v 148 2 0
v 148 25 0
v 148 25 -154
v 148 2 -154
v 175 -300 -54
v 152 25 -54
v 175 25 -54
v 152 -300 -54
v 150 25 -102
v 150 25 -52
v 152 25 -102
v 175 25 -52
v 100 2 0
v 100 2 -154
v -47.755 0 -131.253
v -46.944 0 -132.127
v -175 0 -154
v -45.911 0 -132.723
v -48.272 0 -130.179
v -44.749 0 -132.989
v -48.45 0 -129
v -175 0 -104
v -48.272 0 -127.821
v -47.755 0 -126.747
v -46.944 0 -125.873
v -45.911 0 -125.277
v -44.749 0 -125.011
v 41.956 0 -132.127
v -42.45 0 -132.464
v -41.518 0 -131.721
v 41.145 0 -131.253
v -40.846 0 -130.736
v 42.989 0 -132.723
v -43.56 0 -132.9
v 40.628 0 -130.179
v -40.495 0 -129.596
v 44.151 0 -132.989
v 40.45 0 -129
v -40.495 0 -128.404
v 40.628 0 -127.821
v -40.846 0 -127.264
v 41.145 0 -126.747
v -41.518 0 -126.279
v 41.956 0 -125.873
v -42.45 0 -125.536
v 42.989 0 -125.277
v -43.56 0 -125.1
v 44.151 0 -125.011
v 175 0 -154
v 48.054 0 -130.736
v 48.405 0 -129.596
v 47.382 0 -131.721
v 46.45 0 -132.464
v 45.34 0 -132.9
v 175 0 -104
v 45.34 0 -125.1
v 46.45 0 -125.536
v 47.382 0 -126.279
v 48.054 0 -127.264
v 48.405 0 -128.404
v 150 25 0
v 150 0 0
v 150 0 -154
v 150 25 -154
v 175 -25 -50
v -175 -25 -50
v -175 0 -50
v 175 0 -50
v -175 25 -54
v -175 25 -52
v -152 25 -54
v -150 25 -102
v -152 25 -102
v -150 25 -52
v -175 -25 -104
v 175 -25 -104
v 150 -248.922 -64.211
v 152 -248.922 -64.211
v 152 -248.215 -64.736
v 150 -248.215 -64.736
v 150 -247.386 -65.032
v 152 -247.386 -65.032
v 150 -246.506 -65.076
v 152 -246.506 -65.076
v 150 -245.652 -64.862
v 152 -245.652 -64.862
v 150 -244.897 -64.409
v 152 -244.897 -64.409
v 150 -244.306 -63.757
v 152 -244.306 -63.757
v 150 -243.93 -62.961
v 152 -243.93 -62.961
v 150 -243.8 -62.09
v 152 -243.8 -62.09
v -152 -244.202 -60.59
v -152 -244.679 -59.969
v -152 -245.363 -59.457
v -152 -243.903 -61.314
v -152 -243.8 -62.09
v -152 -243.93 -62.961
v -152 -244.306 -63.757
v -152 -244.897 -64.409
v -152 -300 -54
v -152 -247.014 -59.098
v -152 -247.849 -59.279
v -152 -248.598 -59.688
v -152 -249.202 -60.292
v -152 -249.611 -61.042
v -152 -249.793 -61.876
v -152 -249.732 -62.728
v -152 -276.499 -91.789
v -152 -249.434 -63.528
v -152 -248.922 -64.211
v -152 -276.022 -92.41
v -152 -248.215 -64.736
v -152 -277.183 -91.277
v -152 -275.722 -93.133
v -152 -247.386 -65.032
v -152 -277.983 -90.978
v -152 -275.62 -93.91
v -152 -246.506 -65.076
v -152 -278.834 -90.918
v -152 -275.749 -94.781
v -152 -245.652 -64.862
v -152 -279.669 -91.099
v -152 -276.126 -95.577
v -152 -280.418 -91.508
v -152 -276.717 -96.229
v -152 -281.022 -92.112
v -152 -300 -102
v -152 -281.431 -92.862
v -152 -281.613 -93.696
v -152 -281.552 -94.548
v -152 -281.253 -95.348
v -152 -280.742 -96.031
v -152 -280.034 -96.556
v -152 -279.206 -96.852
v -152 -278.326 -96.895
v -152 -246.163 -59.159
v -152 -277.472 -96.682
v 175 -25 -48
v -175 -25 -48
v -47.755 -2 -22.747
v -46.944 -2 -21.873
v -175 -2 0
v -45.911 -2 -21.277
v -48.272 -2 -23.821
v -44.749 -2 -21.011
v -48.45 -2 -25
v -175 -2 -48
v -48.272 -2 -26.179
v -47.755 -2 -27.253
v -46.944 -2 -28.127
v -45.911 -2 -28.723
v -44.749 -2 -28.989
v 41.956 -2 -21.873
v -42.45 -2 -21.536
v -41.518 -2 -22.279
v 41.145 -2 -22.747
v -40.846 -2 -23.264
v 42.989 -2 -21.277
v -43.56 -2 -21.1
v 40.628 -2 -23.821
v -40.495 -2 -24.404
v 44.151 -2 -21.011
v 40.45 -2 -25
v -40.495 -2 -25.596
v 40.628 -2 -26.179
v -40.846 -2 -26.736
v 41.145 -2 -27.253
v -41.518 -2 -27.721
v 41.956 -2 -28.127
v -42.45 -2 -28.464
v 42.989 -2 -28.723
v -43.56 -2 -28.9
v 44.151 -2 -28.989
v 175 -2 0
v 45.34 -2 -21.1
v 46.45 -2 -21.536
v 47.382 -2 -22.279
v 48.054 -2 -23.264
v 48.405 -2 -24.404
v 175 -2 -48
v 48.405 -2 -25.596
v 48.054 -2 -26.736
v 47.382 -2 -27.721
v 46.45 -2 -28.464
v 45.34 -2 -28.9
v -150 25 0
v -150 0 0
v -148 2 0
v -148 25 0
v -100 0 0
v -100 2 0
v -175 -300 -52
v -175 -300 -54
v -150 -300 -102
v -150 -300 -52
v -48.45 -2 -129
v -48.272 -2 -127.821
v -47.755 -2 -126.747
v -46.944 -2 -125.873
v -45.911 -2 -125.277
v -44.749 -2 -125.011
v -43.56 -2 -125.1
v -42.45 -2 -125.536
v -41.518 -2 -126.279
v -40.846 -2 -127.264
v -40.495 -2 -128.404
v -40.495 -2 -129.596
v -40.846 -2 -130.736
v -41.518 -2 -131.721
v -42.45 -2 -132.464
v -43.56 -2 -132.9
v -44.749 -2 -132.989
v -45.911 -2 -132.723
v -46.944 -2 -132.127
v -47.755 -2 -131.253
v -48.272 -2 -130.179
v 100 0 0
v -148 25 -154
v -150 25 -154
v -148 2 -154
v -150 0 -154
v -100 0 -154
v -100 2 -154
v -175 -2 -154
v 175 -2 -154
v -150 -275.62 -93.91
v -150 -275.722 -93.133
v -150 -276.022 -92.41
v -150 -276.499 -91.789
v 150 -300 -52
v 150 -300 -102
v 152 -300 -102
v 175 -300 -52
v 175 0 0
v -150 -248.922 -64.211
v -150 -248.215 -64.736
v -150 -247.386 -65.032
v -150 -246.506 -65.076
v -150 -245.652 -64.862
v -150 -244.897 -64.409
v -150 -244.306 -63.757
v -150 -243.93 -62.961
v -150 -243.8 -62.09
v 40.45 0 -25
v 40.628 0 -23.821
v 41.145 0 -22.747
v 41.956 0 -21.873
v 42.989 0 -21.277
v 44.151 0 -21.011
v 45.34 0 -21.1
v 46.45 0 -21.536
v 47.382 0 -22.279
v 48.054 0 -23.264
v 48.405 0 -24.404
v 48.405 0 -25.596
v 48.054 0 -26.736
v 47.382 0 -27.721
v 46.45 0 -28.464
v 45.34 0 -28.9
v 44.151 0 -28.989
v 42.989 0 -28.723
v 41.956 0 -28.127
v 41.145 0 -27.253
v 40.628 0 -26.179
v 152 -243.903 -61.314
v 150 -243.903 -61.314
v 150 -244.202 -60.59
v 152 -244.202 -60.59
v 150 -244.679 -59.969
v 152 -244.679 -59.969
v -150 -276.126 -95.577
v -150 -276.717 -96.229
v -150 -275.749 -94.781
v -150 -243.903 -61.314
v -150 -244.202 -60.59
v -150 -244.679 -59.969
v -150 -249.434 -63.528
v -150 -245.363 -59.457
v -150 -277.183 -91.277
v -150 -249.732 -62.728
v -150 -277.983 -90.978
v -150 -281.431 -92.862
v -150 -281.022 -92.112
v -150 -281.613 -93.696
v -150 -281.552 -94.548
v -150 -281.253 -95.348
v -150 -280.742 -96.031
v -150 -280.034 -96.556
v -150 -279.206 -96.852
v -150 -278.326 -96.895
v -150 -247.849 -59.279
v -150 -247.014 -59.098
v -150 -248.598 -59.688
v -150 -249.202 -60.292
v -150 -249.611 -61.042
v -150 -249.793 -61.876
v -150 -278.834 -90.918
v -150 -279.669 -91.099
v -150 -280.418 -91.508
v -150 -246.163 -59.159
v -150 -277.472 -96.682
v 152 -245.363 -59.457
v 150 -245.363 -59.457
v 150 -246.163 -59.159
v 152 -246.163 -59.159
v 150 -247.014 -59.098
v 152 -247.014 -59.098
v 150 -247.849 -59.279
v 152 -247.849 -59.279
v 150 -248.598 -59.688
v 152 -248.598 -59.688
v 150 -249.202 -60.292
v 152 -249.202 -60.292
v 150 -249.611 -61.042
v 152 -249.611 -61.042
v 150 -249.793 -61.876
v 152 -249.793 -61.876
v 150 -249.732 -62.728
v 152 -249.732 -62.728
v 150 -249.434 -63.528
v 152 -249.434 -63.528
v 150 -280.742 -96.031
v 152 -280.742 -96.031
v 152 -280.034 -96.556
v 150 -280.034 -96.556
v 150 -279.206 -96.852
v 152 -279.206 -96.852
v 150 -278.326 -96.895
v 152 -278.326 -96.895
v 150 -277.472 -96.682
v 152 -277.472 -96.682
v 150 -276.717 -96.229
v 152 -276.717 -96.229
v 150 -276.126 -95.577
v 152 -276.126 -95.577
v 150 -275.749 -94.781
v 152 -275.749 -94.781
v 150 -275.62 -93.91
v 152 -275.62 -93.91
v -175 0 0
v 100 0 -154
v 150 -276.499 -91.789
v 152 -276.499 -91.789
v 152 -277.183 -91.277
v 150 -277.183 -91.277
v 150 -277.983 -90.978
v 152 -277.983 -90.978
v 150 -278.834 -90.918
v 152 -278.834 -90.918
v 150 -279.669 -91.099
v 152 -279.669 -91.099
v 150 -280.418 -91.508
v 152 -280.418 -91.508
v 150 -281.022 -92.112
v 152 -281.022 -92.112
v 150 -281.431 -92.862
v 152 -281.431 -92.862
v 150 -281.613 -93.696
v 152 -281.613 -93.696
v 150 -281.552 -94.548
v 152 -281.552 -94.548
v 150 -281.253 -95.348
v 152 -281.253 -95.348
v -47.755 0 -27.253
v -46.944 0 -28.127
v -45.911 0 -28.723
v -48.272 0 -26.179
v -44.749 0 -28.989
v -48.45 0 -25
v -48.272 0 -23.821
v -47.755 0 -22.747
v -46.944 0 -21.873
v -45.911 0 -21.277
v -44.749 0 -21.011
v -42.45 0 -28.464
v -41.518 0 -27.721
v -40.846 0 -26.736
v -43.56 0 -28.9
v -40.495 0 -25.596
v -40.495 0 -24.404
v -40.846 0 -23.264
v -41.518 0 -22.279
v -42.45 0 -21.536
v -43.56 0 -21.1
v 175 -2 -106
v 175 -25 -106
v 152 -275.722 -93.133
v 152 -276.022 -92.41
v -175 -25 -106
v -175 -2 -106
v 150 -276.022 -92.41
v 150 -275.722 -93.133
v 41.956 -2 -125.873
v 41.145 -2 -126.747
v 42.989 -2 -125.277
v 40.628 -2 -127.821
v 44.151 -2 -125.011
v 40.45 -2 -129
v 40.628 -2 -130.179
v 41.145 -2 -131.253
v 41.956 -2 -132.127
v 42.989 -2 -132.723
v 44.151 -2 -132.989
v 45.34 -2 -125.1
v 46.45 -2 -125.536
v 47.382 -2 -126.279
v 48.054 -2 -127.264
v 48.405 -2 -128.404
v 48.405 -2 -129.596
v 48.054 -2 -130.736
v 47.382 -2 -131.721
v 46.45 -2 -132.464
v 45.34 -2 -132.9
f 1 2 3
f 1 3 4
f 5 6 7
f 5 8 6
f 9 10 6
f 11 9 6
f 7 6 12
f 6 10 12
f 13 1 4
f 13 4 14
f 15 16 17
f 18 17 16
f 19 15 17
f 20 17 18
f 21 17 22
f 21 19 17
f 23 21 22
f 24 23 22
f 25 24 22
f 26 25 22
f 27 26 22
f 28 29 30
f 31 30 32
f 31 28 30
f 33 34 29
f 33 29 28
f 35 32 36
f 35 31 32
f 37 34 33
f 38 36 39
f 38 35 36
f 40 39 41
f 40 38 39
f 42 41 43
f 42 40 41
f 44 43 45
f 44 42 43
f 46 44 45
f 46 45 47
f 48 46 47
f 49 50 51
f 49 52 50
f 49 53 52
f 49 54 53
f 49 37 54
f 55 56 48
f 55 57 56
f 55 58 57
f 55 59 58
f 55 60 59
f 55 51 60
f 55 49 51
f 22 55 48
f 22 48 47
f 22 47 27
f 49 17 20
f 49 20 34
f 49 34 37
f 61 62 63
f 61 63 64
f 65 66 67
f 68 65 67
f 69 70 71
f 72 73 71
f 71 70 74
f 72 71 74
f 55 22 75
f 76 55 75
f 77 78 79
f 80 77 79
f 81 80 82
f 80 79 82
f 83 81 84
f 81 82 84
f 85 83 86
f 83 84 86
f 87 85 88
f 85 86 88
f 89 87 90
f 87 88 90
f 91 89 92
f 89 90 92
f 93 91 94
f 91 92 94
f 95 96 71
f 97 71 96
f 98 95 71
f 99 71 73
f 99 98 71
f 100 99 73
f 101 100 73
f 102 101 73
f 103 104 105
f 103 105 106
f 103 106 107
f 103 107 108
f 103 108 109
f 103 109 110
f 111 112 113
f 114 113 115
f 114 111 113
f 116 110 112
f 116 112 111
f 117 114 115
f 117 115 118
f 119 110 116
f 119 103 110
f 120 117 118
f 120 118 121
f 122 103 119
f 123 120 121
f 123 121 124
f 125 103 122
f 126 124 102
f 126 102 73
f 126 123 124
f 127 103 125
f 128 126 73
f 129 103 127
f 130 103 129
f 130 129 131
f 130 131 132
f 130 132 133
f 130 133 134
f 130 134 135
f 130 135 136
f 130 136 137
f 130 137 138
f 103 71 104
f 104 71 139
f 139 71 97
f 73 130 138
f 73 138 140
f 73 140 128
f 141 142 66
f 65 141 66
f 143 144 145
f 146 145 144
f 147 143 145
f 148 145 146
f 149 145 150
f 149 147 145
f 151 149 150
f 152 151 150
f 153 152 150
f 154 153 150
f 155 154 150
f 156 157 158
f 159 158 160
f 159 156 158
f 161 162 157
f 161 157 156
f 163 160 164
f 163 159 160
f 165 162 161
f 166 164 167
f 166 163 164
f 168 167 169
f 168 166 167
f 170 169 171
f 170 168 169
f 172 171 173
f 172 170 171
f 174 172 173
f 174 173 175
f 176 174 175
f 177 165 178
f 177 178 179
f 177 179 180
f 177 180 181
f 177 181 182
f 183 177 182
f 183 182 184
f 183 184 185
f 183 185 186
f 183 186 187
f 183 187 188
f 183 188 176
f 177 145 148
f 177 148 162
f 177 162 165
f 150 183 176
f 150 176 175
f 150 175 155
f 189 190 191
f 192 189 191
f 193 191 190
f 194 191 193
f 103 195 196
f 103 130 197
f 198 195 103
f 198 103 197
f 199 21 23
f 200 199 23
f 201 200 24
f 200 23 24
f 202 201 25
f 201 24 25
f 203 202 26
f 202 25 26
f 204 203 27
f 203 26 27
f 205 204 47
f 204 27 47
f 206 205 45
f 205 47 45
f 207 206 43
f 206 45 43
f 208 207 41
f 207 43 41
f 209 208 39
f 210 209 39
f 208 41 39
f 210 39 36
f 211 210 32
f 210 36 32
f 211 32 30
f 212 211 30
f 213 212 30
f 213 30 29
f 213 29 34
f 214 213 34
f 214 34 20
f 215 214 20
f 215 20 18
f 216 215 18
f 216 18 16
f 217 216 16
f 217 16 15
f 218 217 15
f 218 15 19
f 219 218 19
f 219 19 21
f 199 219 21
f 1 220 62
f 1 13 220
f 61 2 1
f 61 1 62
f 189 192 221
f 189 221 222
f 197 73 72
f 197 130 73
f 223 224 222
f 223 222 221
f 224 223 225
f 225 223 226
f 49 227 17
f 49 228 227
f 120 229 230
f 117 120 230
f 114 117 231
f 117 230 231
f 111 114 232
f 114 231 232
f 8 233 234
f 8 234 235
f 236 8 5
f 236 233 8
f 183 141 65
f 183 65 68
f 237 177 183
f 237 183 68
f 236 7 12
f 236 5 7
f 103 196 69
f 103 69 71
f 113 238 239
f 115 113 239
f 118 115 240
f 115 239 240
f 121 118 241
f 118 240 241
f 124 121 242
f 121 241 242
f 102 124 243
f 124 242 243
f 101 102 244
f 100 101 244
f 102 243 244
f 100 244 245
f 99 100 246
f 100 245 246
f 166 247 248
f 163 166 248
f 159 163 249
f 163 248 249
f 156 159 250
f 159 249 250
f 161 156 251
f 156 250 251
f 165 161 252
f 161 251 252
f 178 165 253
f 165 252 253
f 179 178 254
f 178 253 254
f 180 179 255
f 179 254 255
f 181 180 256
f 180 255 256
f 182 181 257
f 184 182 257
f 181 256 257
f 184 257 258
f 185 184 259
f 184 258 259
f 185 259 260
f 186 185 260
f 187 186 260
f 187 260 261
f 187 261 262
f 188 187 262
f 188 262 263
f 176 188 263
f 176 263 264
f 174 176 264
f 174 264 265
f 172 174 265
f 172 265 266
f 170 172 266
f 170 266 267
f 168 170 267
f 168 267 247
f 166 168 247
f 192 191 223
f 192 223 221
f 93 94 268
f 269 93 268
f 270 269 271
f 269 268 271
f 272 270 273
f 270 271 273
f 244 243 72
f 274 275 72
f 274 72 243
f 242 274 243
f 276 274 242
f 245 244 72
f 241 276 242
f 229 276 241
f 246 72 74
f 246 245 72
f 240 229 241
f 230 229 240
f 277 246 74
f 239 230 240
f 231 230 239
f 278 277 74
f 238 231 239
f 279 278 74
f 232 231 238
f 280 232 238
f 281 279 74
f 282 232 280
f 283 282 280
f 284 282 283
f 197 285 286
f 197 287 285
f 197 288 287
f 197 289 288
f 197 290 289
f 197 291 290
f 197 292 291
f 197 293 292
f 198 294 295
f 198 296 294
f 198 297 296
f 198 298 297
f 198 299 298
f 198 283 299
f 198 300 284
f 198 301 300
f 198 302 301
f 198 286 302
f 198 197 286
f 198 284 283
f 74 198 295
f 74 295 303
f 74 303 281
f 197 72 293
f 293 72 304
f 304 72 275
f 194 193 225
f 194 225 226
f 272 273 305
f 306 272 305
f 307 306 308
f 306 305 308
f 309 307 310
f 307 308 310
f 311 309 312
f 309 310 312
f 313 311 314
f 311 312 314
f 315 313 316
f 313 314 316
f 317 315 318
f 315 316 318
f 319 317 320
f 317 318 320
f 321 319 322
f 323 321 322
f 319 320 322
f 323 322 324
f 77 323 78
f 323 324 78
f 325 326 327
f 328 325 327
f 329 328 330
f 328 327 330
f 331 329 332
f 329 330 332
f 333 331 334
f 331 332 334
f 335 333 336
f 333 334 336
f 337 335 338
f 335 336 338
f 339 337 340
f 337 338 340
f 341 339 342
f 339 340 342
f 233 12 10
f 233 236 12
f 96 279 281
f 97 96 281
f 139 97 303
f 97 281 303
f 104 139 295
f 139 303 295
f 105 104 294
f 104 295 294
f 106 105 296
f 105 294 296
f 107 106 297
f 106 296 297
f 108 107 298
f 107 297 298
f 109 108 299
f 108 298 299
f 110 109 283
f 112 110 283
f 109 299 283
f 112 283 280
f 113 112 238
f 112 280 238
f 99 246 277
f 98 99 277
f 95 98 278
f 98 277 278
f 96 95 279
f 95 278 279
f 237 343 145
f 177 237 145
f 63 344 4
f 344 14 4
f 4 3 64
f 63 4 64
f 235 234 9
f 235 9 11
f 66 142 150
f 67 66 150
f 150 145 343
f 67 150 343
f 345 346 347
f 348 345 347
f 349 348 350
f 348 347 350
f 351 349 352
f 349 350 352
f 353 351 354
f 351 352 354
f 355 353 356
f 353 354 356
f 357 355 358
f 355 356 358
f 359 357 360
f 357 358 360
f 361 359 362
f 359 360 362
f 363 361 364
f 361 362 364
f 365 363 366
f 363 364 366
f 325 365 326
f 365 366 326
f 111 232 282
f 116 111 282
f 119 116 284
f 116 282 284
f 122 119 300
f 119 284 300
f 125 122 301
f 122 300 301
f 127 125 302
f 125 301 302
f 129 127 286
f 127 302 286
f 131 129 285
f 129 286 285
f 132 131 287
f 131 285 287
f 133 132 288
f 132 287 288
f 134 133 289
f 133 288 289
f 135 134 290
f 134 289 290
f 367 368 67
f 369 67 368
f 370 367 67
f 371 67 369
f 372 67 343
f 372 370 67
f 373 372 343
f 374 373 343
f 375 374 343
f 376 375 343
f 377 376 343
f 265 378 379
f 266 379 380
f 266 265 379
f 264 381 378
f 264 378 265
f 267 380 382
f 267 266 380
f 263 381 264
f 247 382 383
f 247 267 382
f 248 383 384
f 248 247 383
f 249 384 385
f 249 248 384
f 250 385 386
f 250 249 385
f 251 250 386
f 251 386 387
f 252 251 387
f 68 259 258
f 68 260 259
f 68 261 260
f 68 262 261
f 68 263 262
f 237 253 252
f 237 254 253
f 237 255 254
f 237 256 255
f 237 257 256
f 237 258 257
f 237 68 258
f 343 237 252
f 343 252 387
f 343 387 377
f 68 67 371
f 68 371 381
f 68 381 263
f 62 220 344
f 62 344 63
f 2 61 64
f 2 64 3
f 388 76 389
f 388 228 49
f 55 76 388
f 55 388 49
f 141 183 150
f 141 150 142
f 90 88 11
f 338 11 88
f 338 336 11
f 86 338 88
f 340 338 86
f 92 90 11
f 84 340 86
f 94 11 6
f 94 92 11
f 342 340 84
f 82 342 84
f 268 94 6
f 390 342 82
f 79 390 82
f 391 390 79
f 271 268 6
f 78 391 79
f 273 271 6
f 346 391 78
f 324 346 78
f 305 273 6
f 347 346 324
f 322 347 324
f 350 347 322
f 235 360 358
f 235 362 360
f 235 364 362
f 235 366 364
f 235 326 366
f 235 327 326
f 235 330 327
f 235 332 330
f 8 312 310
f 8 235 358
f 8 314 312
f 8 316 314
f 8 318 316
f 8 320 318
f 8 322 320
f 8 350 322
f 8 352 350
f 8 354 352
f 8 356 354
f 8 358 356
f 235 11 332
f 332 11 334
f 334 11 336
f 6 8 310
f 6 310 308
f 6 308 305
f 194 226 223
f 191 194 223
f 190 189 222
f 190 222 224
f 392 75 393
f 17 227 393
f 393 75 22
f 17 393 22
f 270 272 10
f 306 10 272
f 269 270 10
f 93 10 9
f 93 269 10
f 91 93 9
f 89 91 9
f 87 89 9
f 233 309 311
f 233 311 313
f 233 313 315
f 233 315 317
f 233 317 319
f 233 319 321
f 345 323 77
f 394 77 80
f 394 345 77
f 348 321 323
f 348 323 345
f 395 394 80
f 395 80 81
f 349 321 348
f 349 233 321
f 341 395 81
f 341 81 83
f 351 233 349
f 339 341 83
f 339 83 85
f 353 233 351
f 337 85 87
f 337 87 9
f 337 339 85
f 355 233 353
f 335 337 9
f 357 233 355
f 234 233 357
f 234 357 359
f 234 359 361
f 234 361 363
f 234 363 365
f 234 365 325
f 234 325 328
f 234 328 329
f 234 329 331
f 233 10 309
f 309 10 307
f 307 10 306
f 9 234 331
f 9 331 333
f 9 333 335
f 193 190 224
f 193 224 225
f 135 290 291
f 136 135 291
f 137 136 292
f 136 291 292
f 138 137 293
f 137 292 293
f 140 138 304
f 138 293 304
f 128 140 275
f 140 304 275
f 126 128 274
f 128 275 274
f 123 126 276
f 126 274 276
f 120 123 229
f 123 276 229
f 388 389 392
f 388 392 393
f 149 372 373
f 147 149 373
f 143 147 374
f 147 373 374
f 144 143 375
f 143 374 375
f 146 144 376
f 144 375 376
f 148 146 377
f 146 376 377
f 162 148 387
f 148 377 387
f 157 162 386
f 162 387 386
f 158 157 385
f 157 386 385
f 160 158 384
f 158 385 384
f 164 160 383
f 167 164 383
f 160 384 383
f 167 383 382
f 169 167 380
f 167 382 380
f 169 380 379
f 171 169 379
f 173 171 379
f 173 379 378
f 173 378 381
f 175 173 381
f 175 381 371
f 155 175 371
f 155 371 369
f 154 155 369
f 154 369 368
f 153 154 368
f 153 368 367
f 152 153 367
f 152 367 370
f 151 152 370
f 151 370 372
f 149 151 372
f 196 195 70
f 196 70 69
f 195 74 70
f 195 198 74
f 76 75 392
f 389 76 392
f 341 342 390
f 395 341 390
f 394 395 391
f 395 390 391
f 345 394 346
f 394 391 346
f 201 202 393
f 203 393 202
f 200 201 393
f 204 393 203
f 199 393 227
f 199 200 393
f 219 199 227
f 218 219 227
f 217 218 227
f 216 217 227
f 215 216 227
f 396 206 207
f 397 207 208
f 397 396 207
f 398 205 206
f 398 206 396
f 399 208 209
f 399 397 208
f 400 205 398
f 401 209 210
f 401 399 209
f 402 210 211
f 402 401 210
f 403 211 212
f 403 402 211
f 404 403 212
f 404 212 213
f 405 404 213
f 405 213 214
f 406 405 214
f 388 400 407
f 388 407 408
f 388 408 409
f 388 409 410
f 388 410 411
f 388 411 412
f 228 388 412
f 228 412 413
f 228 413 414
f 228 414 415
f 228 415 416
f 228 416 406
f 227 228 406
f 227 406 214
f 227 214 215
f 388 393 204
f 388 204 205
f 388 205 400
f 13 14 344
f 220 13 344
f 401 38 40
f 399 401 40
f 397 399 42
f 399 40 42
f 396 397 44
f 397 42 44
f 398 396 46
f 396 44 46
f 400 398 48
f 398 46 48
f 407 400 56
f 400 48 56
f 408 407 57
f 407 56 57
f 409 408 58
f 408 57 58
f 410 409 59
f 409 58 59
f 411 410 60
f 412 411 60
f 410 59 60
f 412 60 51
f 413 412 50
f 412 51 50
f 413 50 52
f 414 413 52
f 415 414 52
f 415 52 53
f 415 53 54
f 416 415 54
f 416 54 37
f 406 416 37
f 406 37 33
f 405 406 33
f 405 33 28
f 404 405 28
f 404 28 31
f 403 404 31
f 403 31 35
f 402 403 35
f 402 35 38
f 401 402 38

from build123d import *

# Parameters (mm, degrees)
F1_DEPTH      = 175
F3_DEPTH      = 300
F3_DEPTH_BACK = 25
F5_DEPTH      = 154
F6_R          = 4
F7_DEPTH      = 25
F9_DEPTH      = 400


with BuildPart() as f1:
    # F0 (on Right) → F1 (new body, symmetric)
    with BuildSketch(Plane.YZ):
        Polygon((0, -154), (0, -104), (-25, -104), (-25, -106), (-2, -106), (-2, -154), align=None)
    extrude(amount=F1_DEPTH, both=True)


with BuildPart() as f1b:
    # F0 (on Right) → F1, piece 2 (new body, symmetric)
    with BuildSketch(Plane.YZ):
        Polygon((0, -50), (0, 0), (-2, 0), (-2, -48), (-25, -48), (-25, -50), align=None)
    extrude(amount=F1_DEPTH, both=True)


with BuildPart() as f3:
    # F2 (on Front) → F3 (new body, two sides)
    with BuildSketch(Plane.XZ) as f3_sk:
        Polygon((175, -52), (150, -52), (150, -102), (152, -102), (152, -54), (175, -54), align=None)
    extrude(amount=F3_DEPTH)
    extrude(f3_sk.sketch, amount=-F3_DEPTH_BACK)


with BuildPart() as f3b:
    # F2 (on Front) → F3, piece 2 (new body, two sides)
    with BuildSketch(Plane.XZ) as f3_2_sk:
        Polygon((-150, -52), (-175, -52), (-175, -54), (-152, -54), (-152, -102), (-150, -102), align=None)
    extrude(amount=F3_DEPTH)
    extrude(f3_2_sk.sketch, amount=-F3_DEPTH_BACK)


with BuildPart() as f5:
    # F4 (on Top) → F5 (new body)
    with BuildSketch(Plane.XY):
        Polygon((100, 0), (150, 0), (150, 25), (148, 25), (148, 2), (100, 2), align=None)
    extrude(amount=-F5_DEPTH)


with BuildPart() as f5b:
    # F4 (on Top) → F5, piece 2 (new body)
    with BuildSketch(Plane.XY):
        Polygon((-148, 25), (-150, 25), (-150, 0), (-100, 0), (-100, 2), (-148, 2), align=None)
    extrude(amount=-F5_DEPTH)


with BuildPart() as f7_tool:
    # F6 (on face) → F7 (new body)
    with BuildSketch(Plane(origin=(0, 0, 0), x_dir=(-1, 0, 0), z_dir=(0, 1, 0))):
        with Locations((-44.45, -25)):
            Circle(F6_R)
        with Locations((44.45, -25)):
            Circle(F6_R)
        with Locations((-44.45, -129)):
            Circle(F6_R)
        with Locations((44.45, -129)):
            Circle(F6_R)
    extrude(amount=-F7_DEPTH)


with BuildPart() as f1_1:
    add(f1.part)

    # F7: cut by f7_tool
    add(f7_tool.part, mode=Mode.SUBTRACT)


with BuildPart() as f1b_1:
    add(f1b.part)

    # F7: cut by f7_tool
    add(f7_tool.part, mode=Mode.SUBTRACT)


with BuildPart() as f9_tool:
    # F8 (on face) → F9 (new body)
    with BuildSketch(Plane.YZ.offset(152)):
        with BuildLine():
            ThreePointArc((-276.4989507472, -91.7885822331), (-280.7415914343, -91.7885822331), (-280.7415914343, -96.0312229203))
            Line((-280.7415914343, -96.0312229203), (-276.4989507472, -91.7885822331))
        make_face()
        with BuildLine():
            ThreePointArc((-244.6791455938, -59.9687770797), (-248.9217862809, -59.9687770797), (-248.9217862809, -64.2114177669))
            Line((-248.9217862809, -64.2114177669), (-244.6791455938, -59.9687770797))
        make_face()
        with BuildLine():
            Line((-244.6791455938, -59.9687770797), (-248.9217862809, -64.2114177669))
            ThreePointArc((-248.9217862809, -64.2114177669), (-245.6524156403, -64.8617360208), (-243.8004659374, -62.0900974233))
            ThreePointArc((-243.8004659374, -62.0900974233), (-244.0288273398, -60.9420471262), (-244.6791455938, -59.9687770797))
        make_face()
        with BuildLine():
            Line((-276.4989507472, -91.7885822331), (-280.7415914343, -96.0312229203))
            ThreePointArc((-280.7415914343, -96.0312229203), (-277.4722207937, -96.6815411742), (-275.6202710908, -93.9099025767))
            ThreePointArc((-275.6202710908, -93.9099025767), (-275.8486324932, -92.7618522796), (-276.4989507472, -91.7885822331))
        make_face()
    extrude(amount=-F9_DEPTH)


with BuildPart() as f3_1:
    add(f3.part)

    # F9: cut by f9_tool
    add(f9_tool.part, mode=Mode.SUBTRACT)


with BuildPart() as f3b_1:
    add(f3b.part)

    # F9: cut by f9_tool
    add(f9_tool.part, mode=Mode.SUBTRACT)


solid = Compound([f5.part, f5b.part, f1_1.part, f1b_1.part, f3_1.part, f3b_1.part])
